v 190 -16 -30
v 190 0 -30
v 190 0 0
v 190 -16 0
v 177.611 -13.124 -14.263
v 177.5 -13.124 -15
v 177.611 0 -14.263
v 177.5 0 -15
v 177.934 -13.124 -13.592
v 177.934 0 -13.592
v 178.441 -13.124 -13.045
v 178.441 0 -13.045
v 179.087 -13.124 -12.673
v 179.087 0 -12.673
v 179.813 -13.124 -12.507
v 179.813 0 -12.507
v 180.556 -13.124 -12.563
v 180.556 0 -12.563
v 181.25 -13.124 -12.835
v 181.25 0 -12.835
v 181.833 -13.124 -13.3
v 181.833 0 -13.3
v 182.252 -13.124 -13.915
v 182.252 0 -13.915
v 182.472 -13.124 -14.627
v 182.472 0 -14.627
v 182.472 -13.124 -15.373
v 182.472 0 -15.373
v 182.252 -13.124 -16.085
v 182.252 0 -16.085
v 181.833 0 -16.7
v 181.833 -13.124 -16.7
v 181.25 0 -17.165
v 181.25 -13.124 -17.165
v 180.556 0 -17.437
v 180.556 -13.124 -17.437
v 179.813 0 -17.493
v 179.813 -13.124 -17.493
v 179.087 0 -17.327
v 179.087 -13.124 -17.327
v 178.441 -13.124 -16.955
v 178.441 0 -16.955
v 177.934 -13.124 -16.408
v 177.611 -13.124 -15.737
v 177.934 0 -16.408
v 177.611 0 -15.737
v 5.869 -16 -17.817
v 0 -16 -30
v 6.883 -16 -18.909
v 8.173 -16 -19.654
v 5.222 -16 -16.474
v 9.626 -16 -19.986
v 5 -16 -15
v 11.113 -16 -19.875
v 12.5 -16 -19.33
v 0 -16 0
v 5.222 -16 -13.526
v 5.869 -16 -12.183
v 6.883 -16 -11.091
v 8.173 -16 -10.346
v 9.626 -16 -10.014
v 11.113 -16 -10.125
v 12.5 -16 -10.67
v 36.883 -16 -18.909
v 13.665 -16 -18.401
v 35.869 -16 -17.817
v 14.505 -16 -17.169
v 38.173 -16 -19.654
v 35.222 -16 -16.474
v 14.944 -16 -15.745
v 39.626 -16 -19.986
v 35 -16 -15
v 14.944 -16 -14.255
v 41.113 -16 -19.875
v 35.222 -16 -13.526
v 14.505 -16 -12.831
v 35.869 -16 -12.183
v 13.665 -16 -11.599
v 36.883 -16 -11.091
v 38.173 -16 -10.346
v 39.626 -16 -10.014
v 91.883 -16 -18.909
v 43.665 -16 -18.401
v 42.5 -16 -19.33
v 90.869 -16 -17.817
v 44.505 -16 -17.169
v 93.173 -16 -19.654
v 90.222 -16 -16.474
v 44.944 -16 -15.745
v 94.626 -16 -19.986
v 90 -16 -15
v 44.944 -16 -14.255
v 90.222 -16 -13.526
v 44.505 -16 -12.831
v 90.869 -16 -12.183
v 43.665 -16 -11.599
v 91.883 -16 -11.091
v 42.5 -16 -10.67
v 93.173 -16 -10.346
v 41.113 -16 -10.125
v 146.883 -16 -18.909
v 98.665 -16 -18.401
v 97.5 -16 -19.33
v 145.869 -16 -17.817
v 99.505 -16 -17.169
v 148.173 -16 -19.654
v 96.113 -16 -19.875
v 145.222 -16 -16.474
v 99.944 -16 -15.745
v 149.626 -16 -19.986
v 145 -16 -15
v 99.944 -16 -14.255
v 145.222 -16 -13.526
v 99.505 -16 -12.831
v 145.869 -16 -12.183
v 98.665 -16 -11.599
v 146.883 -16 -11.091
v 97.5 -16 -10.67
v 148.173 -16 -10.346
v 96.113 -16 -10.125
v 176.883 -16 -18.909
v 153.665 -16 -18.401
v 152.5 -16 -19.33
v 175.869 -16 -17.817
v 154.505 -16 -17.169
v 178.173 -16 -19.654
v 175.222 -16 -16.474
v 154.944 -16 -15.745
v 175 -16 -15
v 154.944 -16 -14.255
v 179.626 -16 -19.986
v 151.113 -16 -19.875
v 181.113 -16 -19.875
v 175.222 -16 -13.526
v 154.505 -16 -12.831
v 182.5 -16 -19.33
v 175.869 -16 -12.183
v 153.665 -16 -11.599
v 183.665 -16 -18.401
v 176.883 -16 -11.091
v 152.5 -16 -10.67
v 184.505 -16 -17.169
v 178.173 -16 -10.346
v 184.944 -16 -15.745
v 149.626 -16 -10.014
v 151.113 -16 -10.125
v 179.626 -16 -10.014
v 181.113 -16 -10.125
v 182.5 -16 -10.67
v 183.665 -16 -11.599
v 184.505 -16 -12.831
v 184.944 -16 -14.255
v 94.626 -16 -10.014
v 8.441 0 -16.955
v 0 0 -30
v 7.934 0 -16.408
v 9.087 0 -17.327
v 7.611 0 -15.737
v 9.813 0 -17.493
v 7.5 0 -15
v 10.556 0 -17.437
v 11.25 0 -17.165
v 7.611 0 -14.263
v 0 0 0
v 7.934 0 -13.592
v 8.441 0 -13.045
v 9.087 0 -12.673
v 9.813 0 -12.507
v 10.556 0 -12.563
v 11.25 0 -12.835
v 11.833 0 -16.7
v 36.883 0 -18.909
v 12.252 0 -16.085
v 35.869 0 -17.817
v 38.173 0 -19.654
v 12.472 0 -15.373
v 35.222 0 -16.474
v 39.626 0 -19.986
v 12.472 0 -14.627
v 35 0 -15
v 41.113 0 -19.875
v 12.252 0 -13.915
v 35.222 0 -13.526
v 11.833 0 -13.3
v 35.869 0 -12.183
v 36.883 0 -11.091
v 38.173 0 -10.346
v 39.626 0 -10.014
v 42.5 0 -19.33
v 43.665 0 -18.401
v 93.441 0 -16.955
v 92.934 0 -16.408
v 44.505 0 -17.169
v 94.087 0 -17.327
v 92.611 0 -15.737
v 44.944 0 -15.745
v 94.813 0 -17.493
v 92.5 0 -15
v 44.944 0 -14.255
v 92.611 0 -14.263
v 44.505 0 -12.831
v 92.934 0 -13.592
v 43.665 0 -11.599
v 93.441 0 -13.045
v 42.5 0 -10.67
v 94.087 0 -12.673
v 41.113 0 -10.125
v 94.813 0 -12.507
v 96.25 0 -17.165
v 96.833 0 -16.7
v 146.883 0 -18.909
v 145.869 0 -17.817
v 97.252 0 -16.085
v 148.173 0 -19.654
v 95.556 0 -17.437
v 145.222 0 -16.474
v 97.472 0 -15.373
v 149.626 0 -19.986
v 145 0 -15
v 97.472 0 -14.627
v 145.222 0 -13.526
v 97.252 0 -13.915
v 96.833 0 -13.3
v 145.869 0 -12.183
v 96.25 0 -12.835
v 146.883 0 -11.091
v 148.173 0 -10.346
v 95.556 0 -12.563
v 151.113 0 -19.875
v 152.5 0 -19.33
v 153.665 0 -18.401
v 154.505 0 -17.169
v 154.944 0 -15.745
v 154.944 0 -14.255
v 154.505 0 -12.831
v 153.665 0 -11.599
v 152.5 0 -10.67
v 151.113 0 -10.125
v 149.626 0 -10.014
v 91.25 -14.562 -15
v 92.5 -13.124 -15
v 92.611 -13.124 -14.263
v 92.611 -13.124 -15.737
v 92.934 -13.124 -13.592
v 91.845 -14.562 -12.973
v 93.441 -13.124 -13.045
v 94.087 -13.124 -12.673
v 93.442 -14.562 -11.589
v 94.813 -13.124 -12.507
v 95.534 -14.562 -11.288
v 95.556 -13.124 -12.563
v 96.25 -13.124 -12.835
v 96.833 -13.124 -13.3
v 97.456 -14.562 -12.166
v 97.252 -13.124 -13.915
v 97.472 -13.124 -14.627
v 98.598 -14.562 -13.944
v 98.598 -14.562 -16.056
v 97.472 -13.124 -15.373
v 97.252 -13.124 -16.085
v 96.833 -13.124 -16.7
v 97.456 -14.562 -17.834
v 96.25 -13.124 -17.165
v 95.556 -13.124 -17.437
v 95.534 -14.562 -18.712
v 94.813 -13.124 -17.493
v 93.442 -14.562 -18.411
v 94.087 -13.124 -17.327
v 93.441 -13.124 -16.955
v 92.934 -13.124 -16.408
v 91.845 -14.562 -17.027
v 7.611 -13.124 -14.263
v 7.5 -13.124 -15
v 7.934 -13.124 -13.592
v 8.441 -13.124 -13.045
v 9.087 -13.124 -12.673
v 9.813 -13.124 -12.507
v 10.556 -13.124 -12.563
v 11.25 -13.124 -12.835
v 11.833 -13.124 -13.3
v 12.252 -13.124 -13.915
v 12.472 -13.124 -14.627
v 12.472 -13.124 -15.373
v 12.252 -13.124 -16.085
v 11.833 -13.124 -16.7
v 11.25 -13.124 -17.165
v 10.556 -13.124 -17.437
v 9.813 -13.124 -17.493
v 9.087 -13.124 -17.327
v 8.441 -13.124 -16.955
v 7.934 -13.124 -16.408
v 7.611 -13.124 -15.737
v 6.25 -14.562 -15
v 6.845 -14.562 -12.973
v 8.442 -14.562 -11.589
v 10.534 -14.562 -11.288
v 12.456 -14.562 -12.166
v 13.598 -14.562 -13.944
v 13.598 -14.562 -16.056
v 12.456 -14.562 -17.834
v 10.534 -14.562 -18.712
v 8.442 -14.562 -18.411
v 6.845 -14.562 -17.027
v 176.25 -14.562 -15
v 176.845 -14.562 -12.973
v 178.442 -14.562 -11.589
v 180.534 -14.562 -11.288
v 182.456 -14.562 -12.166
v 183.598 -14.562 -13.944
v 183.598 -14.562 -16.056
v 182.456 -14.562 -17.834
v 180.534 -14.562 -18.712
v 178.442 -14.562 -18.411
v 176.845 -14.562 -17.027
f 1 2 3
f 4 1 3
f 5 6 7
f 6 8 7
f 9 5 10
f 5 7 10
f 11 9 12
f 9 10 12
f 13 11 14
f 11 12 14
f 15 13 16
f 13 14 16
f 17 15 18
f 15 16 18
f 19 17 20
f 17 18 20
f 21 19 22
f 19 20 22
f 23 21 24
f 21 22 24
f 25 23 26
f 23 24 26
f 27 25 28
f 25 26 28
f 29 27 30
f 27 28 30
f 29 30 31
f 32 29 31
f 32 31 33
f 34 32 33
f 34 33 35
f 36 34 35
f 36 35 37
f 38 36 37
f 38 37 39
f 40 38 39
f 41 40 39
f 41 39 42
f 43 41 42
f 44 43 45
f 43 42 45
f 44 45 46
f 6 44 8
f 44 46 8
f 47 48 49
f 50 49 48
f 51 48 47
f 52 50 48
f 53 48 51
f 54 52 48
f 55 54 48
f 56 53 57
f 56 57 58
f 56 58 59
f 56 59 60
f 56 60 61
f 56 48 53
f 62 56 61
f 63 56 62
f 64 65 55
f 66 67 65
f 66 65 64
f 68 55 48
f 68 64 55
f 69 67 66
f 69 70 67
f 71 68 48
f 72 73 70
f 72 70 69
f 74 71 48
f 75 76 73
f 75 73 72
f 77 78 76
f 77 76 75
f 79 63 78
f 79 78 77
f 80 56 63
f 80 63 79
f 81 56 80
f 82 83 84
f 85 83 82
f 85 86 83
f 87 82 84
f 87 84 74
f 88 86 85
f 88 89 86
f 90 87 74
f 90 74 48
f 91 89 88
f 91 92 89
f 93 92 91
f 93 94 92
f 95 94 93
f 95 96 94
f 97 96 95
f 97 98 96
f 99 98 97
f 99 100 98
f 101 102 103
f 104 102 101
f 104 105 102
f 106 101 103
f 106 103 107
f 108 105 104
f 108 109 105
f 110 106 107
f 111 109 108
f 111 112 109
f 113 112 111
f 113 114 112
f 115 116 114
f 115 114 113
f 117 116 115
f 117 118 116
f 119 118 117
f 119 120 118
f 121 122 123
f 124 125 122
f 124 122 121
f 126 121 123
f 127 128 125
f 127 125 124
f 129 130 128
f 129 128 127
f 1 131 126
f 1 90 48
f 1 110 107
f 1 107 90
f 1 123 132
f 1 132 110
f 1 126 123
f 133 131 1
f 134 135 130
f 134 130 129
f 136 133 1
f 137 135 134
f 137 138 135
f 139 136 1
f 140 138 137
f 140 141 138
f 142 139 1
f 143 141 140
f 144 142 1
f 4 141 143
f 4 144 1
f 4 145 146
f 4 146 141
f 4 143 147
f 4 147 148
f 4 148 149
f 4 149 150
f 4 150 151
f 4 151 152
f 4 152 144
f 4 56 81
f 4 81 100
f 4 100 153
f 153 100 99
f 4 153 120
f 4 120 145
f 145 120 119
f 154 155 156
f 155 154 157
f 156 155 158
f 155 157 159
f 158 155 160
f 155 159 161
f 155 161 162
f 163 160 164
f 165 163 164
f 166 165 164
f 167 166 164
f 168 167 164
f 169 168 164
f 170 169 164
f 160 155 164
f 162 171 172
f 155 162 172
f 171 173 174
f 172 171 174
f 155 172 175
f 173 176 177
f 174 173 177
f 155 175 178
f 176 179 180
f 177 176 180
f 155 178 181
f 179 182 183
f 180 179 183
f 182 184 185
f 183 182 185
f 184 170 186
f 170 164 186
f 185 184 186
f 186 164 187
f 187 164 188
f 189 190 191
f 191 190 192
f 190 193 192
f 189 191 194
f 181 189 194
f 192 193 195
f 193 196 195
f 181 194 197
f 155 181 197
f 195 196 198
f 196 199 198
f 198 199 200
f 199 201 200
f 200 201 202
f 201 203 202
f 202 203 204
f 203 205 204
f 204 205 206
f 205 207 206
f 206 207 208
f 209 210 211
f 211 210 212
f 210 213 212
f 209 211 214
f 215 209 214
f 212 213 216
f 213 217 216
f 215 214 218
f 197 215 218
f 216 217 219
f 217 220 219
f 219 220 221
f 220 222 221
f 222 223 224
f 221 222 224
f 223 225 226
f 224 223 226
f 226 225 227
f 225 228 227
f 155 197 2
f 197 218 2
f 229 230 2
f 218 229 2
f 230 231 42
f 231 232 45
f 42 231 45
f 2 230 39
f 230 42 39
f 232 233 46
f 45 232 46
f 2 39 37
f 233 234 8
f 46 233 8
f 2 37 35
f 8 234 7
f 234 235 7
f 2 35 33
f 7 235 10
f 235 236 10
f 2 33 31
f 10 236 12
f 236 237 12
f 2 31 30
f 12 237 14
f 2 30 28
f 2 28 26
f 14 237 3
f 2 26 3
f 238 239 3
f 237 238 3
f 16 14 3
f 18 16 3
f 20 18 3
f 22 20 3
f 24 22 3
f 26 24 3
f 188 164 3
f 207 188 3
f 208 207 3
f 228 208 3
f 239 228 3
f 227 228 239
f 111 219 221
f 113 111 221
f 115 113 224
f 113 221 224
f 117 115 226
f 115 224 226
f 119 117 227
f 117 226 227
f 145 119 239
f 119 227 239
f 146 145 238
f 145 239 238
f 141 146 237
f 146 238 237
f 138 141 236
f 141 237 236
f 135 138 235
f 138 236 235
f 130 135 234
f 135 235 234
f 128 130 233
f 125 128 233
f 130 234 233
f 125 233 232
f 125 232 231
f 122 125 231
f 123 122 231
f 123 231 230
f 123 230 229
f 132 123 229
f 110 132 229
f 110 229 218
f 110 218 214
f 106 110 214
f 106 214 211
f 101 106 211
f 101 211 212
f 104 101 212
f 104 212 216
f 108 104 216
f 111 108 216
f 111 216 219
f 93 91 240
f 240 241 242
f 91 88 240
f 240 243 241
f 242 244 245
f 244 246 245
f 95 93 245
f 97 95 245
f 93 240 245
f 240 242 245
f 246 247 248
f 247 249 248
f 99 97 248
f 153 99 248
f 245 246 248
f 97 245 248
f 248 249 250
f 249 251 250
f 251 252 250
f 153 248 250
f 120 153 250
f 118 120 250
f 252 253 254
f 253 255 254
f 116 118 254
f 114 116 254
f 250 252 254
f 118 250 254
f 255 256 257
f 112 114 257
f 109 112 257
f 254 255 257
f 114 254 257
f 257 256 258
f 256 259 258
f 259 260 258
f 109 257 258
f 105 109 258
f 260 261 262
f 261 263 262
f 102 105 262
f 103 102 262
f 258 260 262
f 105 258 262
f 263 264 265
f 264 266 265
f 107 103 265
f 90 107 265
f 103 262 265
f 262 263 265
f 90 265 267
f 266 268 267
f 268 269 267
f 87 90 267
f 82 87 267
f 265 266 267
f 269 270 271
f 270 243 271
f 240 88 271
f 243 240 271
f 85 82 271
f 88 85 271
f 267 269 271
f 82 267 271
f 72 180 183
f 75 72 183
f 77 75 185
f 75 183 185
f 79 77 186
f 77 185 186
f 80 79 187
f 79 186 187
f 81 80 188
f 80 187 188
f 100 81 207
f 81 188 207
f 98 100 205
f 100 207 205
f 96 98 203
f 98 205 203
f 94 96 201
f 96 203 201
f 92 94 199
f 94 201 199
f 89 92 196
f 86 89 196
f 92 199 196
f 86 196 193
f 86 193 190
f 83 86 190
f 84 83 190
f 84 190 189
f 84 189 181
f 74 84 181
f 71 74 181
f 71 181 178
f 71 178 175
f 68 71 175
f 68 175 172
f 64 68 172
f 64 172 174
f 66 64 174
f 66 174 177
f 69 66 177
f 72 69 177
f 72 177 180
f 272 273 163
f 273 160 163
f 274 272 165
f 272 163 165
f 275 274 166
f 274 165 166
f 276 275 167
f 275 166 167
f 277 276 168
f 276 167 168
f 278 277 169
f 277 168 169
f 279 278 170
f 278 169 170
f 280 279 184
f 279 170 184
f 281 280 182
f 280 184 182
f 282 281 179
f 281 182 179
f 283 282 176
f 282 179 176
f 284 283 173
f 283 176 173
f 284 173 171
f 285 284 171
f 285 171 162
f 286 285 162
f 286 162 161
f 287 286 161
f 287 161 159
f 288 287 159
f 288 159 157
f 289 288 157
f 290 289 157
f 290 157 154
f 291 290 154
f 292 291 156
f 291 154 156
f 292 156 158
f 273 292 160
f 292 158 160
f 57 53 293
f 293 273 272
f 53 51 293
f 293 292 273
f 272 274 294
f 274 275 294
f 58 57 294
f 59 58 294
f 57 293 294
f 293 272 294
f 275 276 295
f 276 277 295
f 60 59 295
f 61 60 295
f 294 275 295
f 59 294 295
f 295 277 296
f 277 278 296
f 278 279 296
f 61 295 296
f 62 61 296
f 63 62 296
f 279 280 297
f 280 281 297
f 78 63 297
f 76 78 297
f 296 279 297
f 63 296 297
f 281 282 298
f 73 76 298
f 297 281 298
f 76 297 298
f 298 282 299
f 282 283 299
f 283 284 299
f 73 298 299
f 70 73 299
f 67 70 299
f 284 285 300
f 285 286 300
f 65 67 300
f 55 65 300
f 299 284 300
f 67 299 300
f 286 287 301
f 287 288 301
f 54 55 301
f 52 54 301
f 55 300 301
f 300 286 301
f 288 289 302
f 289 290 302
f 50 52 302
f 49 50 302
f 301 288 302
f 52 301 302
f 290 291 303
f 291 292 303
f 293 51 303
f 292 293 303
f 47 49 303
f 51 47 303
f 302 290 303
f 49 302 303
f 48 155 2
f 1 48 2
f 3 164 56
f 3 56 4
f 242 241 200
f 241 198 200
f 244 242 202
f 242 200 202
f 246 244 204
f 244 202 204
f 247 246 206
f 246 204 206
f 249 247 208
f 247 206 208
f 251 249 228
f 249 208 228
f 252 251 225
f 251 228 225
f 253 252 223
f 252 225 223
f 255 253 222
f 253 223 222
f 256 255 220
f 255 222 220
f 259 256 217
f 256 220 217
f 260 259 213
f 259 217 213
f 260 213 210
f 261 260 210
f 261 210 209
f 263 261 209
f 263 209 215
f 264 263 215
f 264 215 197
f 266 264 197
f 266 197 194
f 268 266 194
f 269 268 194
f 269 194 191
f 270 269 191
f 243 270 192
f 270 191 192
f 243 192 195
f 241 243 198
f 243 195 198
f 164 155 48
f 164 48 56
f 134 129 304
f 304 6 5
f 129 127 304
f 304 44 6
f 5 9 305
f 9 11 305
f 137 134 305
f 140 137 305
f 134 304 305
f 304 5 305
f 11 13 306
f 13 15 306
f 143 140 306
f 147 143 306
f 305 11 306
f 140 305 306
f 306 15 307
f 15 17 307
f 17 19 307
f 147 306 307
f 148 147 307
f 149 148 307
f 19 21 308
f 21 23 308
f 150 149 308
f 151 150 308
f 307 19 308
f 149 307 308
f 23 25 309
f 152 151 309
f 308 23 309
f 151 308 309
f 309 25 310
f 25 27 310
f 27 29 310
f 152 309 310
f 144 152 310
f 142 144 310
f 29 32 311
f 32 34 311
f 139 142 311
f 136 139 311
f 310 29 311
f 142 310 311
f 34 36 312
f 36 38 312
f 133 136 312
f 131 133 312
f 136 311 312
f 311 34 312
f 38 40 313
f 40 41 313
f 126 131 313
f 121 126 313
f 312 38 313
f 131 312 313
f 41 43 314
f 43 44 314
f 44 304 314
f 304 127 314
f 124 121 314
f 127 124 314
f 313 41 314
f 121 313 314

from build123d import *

# Parameters (mm, degrees)
F0_W           = 190
F0_H           = 30
F1_DEPTH       = 16
F3_D           = 10
F4_D           = 5
F4_CSINK_D     = 10
F4_CSINK_ANGLE = 82


with BuildPart() as f1:
    # F0 (on Front) → F1 (new body)
    with BuildSketch(Plane.XZ):
        with Locations((95, -15)):
            Rectangle(F0_W, F0_H)
    extrude(amount=F1_DEPTH)

    # F3 (through all)
    with Locations(Plane.XZ.offset(16)):
        with Locations((40, -15), (150, -15)):
            Hole(F3_D / 2)

    # F4 (through all)
    with Locations(Plane.XZ.offset(16)):
        with Locations((10, -15), (95, -15), (180, -15)):
            CounterSinkHole(F4_D / 2, F4_CSINK_D / 2, counter_sink_angle=F4_CSINK_ANGLE)


solid = f1.part
